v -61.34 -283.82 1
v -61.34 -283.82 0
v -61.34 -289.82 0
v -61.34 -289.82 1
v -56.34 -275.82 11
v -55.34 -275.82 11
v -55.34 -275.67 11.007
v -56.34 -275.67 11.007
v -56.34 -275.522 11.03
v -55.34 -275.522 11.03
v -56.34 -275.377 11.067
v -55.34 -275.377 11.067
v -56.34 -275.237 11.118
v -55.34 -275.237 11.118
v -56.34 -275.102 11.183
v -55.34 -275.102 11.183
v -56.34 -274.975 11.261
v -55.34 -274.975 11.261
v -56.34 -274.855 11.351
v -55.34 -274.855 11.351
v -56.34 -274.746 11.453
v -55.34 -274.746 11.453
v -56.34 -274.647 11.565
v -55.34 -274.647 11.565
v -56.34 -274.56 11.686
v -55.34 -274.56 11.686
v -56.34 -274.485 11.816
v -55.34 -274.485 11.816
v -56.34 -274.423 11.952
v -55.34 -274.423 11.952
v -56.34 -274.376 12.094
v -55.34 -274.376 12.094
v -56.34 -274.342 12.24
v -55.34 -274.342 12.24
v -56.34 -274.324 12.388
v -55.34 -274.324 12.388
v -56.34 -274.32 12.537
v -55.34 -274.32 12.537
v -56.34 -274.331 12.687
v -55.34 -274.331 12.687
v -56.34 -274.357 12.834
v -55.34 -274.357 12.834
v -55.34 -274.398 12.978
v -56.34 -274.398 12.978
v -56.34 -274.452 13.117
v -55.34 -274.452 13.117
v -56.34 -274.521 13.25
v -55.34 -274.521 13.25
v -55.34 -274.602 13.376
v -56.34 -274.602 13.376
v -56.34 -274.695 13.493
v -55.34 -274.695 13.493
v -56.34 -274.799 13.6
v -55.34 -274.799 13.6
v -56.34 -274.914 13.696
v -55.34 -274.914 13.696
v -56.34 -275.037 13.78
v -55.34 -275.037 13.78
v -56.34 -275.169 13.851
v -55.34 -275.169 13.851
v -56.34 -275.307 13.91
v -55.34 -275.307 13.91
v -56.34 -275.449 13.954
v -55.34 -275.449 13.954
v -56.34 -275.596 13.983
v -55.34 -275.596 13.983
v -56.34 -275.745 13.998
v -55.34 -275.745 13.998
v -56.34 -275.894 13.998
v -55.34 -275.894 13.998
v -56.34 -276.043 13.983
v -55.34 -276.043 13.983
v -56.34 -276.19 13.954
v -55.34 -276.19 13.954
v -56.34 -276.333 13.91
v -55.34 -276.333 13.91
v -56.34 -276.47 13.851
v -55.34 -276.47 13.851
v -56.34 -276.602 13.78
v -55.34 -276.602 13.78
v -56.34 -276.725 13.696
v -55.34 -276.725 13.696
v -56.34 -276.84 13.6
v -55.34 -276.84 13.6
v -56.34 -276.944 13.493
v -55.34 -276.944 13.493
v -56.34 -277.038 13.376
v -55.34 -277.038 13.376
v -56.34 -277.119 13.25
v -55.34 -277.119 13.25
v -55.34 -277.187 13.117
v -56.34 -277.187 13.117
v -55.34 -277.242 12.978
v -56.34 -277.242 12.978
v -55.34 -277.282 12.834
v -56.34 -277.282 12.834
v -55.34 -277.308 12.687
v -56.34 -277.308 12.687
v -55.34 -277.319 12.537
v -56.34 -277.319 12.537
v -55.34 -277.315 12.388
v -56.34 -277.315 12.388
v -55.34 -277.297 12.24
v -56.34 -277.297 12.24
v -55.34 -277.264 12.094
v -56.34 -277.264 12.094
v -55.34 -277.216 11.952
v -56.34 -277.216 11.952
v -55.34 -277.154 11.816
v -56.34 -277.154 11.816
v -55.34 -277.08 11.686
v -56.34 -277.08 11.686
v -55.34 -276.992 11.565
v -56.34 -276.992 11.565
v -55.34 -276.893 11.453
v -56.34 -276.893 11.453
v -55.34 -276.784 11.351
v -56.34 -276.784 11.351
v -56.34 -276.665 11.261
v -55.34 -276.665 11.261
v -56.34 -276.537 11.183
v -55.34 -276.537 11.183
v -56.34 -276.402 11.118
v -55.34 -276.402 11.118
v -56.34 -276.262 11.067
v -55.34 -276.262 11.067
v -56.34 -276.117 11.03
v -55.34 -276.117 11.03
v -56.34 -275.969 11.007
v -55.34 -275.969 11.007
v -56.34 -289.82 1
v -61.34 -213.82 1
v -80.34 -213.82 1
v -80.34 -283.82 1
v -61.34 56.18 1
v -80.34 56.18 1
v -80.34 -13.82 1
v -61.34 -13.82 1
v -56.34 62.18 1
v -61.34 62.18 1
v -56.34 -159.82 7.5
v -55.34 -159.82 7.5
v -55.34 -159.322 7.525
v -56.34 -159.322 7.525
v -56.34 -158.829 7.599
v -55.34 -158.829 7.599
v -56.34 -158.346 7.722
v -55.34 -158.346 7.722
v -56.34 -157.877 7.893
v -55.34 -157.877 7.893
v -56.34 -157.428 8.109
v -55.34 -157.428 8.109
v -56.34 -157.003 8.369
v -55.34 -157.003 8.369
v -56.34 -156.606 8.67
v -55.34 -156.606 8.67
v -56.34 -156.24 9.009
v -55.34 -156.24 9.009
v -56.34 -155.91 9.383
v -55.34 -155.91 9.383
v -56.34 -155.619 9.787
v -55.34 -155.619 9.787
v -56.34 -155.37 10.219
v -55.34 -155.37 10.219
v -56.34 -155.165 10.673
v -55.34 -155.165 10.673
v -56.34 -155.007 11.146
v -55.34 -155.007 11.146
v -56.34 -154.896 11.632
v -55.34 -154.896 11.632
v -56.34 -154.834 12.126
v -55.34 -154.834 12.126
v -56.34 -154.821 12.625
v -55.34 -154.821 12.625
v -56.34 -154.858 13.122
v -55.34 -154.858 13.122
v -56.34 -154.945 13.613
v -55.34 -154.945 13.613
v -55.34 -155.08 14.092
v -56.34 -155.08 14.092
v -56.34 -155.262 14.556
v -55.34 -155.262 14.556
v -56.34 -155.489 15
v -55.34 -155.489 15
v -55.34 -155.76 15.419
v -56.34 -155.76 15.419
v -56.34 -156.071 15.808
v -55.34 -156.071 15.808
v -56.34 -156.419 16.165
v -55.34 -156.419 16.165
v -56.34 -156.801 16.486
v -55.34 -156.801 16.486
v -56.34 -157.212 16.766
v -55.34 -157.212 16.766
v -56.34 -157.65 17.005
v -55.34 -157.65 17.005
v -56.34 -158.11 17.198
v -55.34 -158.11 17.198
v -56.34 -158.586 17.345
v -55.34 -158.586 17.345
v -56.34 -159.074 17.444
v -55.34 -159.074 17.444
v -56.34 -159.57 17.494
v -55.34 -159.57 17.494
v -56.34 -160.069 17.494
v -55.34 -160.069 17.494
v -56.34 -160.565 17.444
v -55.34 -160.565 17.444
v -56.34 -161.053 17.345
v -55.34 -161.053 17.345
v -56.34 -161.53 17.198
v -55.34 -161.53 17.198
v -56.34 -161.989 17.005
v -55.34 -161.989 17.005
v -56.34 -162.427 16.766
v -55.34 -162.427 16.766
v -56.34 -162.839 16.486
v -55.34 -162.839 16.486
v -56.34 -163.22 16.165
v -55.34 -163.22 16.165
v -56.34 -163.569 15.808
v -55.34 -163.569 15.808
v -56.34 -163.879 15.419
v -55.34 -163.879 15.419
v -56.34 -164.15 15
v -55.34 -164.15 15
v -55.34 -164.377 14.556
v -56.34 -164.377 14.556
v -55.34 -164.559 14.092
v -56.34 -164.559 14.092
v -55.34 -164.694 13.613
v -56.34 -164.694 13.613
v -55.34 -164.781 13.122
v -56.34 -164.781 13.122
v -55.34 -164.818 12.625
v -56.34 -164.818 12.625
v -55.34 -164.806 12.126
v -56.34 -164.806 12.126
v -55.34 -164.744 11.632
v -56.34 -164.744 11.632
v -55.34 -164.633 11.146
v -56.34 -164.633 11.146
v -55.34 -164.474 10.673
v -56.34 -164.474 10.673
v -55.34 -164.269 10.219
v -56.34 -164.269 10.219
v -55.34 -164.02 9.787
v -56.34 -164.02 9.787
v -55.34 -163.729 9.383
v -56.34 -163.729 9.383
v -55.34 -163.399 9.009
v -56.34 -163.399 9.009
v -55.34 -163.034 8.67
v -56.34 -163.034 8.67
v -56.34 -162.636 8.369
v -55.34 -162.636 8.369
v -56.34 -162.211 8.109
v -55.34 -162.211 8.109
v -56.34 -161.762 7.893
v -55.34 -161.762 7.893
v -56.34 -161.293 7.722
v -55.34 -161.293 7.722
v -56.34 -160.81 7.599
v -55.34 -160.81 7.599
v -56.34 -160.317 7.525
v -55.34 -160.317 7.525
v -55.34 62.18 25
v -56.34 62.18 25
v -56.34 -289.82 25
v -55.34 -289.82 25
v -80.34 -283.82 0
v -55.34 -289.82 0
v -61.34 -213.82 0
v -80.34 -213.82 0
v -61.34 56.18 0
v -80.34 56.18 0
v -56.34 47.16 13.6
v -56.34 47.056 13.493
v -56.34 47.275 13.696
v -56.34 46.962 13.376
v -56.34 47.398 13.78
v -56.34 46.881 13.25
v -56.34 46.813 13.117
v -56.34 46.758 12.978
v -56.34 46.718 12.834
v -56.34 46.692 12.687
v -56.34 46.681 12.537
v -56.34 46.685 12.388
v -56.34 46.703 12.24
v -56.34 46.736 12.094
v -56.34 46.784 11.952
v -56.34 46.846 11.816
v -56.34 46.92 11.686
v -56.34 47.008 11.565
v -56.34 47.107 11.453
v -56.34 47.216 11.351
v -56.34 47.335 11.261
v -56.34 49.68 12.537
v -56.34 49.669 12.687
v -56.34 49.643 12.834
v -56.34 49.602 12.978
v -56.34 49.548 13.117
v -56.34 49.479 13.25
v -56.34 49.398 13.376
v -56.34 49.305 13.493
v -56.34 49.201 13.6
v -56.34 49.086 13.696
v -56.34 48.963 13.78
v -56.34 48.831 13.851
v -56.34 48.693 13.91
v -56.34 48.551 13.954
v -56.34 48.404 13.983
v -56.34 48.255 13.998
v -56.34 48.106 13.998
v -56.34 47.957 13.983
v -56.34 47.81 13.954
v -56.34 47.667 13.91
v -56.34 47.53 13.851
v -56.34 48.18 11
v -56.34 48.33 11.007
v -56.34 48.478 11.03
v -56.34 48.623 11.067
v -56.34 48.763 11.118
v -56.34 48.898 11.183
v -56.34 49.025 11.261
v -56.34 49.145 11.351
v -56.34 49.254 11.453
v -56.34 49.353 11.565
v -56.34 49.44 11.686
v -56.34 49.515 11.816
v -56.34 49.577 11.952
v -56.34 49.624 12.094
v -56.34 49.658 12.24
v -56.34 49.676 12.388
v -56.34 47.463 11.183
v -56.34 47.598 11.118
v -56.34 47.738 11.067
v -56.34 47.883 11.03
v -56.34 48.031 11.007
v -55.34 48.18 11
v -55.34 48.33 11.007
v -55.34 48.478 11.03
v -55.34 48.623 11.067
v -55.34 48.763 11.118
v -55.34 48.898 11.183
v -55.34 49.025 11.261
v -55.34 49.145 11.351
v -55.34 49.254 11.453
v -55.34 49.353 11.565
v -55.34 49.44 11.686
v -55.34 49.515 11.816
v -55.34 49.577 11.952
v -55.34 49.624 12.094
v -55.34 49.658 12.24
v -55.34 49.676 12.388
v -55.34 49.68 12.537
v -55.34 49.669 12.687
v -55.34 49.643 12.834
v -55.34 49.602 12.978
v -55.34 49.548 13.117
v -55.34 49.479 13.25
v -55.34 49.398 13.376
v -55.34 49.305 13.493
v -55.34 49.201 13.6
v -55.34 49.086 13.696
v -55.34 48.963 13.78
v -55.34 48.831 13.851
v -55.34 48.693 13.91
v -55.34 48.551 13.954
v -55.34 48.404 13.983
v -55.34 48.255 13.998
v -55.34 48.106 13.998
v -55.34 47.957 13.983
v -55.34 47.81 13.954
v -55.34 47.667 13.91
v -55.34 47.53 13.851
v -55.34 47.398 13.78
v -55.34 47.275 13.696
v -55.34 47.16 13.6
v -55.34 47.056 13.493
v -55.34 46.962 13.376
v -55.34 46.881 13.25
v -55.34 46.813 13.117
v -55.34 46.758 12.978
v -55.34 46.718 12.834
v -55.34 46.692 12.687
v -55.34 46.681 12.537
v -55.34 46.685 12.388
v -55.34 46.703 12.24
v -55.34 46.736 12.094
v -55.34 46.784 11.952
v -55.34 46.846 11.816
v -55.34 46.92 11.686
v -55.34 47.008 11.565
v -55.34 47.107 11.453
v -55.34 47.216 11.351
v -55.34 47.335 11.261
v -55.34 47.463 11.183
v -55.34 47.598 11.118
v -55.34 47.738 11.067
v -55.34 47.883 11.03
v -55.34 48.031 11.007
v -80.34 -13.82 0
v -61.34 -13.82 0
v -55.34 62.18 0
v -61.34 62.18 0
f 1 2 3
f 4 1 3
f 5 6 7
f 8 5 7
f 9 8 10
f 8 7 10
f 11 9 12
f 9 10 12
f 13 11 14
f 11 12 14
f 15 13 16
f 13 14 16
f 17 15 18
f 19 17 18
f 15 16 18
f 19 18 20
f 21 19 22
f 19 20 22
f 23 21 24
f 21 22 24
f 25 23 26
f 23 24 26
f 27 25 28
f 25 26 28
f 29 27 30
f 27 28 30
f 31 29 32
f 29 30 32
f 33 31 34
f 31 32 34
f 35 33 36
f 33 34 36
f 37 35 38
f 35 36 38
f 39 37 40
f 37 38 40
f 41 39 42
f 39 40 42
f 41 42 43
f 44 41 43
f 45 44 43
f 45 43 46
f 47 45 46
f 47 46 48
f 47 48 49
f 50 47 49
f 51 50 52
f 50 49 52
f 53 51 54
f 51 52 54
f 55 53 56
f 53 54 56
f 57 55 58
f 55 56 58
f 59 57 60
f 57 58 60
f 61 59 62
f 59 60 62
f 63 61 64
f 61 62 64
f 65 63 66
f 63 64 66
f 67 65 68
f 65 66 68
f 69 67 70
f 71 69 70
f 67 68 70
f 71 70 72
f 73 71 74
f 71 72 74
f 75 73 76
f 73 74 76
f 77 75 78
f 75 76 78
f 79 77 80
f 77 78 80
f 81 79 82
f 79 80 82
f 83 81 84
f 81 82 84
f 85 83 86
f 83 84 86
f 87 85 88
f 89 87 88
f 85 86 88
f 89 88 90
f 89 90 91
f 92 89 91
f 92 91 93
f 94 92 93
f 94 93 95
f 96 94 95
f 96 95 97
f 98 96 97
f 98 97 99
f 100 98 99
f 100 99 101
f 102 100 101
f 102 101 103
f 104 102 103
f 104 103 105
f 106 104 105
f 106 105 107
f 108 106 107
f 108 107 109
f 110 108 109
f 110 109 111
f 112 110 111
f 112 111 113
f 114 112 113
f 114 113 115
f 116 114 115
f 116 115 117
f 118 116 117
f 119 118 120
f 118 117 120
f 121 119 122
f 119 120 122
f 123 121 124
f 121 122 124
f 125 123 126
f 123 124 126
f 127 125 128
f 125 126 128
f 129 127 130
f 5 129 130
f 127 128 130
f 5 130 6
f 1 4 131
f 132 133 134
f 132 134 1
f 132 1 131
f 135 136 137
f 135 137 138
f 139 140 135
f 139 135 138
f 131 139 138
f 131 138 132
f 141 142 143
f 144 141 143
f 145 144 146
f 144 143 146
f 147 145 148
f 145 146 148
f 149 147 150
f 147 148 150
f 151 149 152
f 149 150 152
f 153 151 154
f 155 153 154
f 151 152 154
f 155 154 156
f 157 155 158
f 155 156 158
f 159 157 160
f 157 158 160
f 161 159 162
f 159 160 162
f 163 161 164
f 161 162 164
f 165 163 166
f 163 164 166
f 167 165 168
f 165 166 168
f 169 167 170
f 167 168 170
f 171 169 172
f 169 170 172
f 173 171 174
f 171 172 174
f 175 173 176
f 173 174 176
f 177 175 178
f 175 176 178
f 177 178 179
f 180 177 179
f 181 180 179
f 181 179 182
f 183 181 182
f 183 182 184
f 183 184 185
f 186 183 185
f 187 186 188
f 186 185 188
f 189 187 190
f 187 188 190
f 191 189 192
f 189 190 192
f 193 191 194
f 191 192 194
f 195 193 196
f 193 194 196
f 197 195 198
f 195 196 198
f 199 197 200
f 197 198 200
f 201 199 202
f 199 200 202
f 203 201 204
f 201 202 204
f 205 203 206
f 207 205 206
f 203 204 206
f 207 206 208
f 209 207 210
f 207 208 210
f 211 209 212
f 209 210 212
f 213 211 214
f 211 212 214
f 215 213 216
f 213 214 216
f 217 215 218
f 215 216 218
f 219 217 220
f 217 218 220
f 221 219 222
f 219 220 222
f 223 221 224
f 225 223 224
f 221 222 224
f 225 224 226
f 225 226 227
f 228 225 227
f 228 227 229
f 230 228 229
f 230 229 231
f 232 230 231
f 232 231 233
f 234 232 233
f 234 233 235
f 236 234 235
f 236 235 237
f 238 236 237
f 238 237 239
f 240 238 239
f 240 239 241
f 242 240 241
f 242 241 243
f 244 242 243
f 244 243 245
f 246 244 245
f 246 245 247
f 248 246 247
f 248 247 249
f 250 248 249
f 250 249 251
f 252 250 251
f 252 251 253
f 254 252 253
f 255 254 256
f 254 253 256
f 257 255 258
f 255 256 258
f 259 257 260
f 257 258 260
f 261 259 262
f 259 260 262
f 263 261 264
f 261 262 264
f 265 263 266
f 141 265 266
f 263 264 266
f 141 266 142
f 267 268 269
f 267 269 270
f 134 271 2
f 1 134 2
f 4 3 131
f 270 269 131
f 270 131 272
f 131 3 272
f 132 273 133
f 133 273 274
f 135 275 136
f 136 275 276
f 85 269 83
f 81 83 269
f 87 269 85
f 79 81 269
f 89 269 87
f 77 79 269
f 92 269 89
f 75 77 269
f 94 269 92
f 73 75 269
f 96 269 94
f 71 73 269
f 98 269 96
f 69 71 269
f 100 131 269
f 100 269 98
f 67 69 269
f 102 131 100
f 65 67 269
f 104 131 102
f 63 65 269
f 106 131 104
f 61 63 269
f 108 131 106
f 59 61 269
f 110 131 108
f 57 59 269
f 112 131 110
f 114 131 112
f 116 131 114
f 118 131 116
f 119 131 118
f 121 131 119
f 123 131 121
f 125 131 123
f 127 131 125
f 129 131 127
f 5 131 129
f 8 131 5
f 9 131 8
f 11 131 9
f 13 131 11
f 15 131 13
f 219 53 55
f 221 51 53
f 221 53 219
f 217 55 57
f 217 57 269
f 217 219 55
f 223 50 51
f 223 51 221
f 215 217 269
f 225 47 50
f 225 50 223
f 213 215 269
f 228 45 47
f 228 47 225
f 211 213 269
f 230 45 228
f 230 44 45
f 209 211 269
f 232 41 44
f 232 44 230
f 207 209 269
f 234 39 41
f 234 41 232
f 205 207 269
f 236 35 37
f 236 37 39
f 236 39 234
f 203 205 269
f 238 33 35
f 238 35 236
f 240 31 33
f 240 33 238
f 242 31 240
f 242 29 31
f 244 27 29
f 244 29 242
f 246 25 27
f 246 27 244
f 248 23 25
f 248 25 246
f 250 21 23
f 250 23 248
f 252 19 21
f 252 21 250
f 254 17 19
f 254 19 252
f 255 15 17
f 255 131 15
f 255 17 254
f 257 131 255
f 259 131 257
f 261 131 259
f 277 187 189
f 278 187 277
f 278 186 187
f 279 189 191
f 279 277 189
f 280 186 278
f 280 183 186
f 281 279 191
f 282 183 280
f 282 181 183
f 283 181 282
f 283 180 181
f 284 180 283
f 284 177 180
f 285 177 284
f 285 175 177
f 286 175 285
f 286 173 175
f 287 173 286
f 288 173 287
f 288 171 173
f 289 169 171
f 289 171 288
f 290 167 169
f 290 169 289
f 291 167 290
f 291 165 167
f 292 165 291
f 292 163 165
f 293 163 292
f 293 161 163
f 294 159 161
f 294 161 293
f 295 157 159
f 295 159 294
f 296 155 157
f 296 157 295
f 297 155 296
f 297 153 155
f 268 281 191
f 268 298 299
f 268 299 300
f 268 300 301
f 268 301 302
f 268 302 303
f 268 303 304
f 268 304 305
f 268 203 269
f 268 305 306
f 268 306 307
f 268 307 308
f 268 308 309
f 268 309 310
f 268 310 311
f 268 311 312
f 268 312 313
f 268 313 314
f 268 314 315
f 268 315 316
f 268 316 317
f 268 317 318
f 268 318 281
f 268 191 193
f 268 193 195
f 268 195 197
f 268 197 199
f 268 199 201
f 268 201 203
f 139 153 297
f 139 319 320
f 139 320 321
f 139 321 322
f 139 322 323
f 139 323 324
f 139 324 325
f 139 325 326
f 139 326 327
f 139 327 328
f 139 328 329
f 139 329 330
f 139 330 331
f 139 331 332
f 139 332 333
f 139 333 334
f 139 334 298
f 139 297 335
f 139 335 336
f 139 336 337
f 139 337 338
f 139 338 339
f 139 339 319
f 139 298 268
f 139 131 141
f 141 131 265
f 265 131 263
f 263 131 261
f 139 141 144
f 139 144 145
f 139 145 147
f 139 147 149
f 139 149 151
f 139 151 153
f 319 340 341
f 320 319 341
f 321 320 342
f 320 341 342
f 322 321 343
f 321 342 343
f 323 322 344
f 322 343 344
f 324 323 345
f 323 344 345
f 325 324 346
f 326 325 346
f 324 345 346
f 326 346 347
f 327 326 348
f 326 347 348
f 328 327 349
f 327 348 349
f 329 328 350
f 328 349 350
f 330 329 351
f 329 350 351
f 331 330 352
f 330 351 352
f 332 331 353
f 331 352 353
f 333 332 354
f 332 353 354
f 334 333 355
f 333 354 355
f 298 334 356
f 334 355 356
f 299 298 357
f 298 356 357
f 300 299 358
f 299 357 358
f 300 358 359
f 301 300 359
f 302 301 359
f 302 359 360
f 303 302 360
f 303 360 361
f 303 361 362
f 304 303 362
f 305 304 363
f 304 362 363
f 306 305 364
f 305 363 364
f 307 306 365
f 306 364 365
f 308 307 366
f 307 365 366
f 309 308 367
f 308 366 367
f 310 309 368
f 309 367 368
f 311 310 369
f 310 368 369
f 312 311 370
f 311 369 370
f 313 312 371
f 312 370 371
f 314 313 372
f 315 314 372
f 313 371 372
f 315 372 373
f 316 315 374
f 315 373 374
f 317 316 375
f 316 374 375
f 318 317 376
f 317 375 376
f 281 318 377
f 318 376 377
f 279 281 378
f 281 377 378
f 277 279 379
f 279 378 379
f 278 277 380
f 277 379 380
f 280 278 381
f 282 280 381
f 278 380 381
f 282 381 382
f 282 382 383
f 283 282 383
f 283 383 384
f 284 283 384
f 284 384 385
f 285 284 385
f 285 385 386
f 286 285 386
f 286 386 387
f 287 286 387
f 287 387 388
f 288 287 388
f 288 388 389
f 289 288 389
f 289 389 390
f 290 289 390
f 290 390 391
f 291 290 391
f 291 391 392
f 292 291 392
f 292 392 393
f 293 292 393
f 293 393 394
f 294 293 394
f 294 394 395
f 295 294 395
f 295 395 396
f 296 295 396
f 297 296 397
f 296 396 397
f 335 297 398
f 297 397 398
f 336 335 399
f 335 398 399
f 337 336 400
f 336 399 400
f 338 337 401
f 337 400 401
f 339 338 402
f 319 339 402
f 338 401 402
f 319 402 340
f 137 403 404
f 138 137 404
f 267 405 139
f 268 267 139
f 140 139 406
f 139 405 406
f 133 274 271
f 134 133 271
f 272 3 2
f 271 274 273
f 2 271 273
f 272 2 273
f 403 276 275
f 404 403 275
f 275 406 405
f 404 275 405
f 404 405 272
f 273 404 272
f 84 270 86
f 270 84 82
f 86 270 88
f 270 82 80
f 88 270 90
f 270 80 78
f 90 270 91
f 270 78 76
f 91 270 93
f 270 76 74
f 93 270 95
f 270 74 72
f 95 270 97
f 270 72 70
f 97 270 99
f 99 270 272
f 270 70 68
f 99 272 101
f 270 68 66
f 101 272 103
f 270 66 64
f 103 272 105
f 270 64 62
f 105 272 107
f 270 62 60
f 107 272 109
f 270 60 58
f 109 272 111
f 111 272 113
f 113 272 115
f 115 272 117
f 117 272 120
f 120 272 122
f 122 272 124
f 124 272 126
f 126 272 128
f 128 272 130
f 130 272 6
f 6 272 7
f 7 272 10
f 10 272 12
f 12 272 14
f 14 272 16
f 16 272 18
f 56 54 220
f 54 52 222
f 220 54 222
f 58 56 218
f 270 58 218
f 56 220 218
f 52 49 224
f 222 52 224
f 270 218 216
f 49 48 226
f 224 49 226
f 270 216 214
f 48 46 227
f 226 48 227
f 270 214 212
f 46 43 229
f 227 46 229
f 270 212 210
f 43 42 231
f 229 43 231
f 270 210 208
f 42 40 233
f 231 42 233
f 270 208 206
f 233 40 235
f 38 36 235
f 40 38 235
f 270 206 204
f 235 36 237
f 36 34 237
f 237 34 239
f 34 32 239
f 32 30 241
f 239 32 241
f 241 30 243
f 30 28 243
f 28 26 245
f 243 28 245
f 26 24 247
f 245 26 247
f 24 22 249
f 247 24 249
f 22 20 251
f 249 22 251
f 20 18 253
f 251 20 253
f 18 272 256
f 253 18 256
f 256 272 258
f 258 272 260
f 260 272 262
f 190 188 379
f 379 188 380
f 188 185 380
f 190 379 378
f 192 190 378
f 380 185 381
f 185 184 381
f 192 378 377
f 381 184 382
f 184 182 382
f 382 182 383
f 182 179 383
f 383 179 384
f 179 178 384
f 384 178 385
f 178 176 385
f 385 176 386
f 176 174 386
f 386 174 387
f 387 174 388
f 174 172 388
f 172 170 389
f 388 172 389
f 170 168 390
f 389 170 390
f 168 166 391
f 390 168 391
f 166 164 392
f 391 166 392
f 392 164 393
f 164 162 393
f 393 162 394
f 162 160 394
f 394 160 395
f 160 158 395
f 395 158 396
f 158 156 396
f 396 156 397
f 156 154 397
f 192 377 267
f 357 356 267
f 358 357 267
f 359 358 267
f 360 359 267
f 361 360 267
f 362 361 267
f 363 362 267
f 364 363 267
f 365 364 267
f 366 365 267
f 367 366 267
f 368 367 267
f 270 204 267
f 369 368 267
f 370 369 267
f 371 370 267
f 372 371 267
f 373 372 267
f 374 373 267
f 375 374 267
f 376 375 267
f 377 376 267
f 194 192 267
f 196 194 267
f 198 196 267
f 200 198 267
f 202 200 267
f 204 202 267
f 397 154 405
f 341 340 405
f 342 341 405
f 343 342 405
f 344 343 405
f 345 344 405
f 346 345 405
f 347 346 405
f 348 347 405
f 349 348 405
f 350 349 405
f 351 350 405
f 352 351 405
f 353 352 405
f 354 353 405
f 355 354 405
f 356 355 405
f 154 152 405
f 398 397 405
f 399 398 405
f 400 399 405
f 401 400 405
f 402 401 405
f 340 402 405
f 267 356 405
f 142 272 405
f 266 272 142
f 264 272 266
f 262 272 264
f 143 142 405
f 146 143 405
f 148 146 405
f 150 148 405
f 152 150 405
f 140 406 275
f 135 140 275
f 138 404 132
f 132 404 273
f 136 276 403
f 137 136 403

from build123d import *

# Parameters (mm, degrees)
CROQUIS2_W              = 1
CROQUIS2_H              = 352
SALIENTE_EXTRUIR2_DEPTH = 25
CROQUIS5_R              = 1.5
CROQUIS5_R_2            = 5
CORTAR_EXTRUIR2_DEPTH   = 1
SALIENTE_EXTRUIR3_DEPTH = 1


with BuildPart() as part:
    # Croquis2 → Saliente-Extruir2 (new body)
    with BuildSketch(Plane.XY):
        with Locations((-55.840004841, -113.819624774)):
            Rectangle(CROQUIS2_W, CROQUIS2_H)
    extrude(amount=SALIENTE_EXTRUIR2_DEPTH)

    # Croquis5 → Cortar-Extruir2 (cut)
    with BuildSketch(Plane(origin=(-55.340004841, 0, 0), x_dir=(0, 0, -1), z_dir=(1, 0, 0))):
        with Locations((-12.5, 48.180375226)):
            Circle(CROQUIS5_R)
        with Locations((-12.5, -275.819624774)):
            Circle(CROQUIS5_R)
        with Locations((-12.5, -159.819624774)):
            Circle(CROQUIS5_R_2)
    extrude(amount=-CORTAR_EXTRUIR2_DEPTH, mode=Mode.SUBTRACT)

    # Croquis1 → Saliente-Extruir3 (add)
    with BuildSketch(Plane.XY):
        Polygon((-56.340004841, 62.180375226), (-61.340004841, 62.180375226), (-61.340004841, 56.180375226), (-80.340004841, 56.180375226), (-80.340004841, -13.819624774), (-61.340004841, -13.819624774), (-61.340004841, -213.819624774), (-80.340004841, -213.819624774), (-80.340004841, -283.819624774), (-61.340004841, -283.819624774), (-61.340004841, -289.819624774), (-56.340004841, -289.819624774), align=None)
    extrude(amount=SALIENTE_EXTRUIR3_DEPTH)


solid = part.part
